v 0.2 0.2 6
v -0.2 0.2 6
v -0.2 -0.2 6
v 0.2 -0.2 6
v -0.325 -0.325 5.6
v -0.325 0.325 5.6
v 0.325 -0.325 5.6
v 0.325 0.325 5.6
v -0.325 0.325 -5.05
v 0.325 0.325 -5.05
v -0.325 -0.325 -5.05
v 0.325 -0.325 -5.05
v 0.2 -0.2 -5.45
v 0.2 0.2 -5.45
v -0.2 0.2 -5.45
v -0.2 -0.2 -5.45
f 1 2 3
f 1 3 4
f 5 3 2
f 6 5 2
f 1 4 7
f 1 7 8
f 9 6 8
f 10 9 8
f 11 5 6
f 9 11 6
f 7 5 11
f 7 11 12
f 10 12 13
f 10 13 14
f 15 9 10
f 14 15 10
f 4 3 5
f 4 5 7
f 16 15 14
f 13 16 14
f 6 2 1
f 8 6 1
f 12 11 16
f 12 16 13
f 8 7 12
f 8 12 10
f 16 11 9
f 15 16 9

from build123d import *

# Parameters (mm, degrees)
ESQUISSE1_W             = 0.65
ESQUISSE1_H             = 0.65
BOSS_EXTRU_1_DEPTH      = 6
BOSS_EXTRU_1_DEPTH_BACK = 5.45
CHANFREIN1_SIZE         = 0.4
CHANFREIN1_SIZE2        = 0.125
CHANFREIN1_PART_2_SIZE  = 0.4
CHANFREIN1_PART_2_SIZE2 = 0.125
CHANFREIN1_PART_3_SIZE  = 0.4
CHANFREIN1_PART_3_SIZE2 = 0.125
CHANFREIN1_PART_4_SIZE  = 0.4
CHANFREIN1_PART_4_SIZE2 = 0.125
CHANFREIN2_SIZE         = 0.125
CHANFREIN2_SIZE2        = 0.4


with BuildPart() as part:
    # Esquisse1 → Boss.-Extru.1 (new body, two sides)
    with BuildSketch(Plane.XY) as boss_extru_1_sk:
        Rectangle(ESQUISSE1_W, ESQUISSE1_H)
    extrude(amount=BOSS_EXTRU_1_DEPTH)
    extrude(boss_extru_1_sk.sketch, amount=-BOSS_EXTRU_1_DEPTH_BACK)

    # Chanfrein1
    chanfrein1_edges = [part.edges().sort_by_distance(p)[0] for p in [
        (0.325, 0, 6),
    ]]
    chanfrein1_side = [part.faces().sort_by_distance(p)[0] for p in [
        (0.325, 0, 0.275),
    ]]
    chamfer(chanfrein1_edges, length=CHANFREIN1_SIZE, length2=CHANFREIN1_SIZE2, reference=chanfrein1_side[0])

    # Chanfrein1 part 2
    chanfrein1_part_2_edges = [part.edges().sort_by_distance(p)[0] for p in [
        (0, 0.325, 6),
    ]]
    chanfrein1_part_2_side = [part.faces().sort_by_distance(p)[0] for p in [
        (0, 0.325, 0.275),
    ]]
    chamfer(chanfrein1_part_2_edges, length=CHANFREIN1_PART_2_SIZE, length2=CHANFREIN1_PART_2_SIZE2, reference=chanfrein1_part_2_side[0])

    # Chanfrein1 part 3
    chanfrein1_part_3_edges = [part.edges().sort_by_distance(p)[0] for p in [
        (-0.325, 0, 6),
    ]]
    chanfrein1_part_3_side = [part.faces().sort_by_distance(p)[0] for p in [
        (-0.325, 0, 0.275),
    ]]
    chamfer(chanfrein1_part_3_edges, length=CHANFREIN1_PART_3_SIZE, length2=CHANFREIN1_PART_3_SIZE2, reference=chanfrein1_part_3_side[0])

    # Chanfrein1 part 4
    chanfrein1_part_4_edges = [part.edges().sort_by_distance(p)[0] for p in [
        (0, -0.325, 6),
    ]]
    chanfrein1_part_4_side = [part.faces().sort_by_distance(p)[0] for p in [
        (0, -0.325, 0.275),
    ]]
    chamfer(chanfrein1_part_4_edges, length=CHANFREIN1_PART_4_SIZE, length2=CHANFREIN1_PART_4_SIZE2, reference=chanfrein1_part_4_side[0])

    # Chanfrein2
    chanfrein2_edges = [part.edges().sort_by_distance(p)[0] for p in [
        (-0.325, 0, -5.45),
        (0, -0.325, -5.45),
        (0.325, 0, -5.45),
        (0, 0.325, -5.45),
    ]]
    chanfrein2_side = [part.faces().sort_by_distance(p)[0] for p in [
        (0, 0, -5.45),
    ]]
    chamfer(chanfrein2_edges, length=CHANFREIN2_SIZE, length2=CHANFREIN2_SIZE2, reference=chanfrein2_side[0])


solid = part.part
